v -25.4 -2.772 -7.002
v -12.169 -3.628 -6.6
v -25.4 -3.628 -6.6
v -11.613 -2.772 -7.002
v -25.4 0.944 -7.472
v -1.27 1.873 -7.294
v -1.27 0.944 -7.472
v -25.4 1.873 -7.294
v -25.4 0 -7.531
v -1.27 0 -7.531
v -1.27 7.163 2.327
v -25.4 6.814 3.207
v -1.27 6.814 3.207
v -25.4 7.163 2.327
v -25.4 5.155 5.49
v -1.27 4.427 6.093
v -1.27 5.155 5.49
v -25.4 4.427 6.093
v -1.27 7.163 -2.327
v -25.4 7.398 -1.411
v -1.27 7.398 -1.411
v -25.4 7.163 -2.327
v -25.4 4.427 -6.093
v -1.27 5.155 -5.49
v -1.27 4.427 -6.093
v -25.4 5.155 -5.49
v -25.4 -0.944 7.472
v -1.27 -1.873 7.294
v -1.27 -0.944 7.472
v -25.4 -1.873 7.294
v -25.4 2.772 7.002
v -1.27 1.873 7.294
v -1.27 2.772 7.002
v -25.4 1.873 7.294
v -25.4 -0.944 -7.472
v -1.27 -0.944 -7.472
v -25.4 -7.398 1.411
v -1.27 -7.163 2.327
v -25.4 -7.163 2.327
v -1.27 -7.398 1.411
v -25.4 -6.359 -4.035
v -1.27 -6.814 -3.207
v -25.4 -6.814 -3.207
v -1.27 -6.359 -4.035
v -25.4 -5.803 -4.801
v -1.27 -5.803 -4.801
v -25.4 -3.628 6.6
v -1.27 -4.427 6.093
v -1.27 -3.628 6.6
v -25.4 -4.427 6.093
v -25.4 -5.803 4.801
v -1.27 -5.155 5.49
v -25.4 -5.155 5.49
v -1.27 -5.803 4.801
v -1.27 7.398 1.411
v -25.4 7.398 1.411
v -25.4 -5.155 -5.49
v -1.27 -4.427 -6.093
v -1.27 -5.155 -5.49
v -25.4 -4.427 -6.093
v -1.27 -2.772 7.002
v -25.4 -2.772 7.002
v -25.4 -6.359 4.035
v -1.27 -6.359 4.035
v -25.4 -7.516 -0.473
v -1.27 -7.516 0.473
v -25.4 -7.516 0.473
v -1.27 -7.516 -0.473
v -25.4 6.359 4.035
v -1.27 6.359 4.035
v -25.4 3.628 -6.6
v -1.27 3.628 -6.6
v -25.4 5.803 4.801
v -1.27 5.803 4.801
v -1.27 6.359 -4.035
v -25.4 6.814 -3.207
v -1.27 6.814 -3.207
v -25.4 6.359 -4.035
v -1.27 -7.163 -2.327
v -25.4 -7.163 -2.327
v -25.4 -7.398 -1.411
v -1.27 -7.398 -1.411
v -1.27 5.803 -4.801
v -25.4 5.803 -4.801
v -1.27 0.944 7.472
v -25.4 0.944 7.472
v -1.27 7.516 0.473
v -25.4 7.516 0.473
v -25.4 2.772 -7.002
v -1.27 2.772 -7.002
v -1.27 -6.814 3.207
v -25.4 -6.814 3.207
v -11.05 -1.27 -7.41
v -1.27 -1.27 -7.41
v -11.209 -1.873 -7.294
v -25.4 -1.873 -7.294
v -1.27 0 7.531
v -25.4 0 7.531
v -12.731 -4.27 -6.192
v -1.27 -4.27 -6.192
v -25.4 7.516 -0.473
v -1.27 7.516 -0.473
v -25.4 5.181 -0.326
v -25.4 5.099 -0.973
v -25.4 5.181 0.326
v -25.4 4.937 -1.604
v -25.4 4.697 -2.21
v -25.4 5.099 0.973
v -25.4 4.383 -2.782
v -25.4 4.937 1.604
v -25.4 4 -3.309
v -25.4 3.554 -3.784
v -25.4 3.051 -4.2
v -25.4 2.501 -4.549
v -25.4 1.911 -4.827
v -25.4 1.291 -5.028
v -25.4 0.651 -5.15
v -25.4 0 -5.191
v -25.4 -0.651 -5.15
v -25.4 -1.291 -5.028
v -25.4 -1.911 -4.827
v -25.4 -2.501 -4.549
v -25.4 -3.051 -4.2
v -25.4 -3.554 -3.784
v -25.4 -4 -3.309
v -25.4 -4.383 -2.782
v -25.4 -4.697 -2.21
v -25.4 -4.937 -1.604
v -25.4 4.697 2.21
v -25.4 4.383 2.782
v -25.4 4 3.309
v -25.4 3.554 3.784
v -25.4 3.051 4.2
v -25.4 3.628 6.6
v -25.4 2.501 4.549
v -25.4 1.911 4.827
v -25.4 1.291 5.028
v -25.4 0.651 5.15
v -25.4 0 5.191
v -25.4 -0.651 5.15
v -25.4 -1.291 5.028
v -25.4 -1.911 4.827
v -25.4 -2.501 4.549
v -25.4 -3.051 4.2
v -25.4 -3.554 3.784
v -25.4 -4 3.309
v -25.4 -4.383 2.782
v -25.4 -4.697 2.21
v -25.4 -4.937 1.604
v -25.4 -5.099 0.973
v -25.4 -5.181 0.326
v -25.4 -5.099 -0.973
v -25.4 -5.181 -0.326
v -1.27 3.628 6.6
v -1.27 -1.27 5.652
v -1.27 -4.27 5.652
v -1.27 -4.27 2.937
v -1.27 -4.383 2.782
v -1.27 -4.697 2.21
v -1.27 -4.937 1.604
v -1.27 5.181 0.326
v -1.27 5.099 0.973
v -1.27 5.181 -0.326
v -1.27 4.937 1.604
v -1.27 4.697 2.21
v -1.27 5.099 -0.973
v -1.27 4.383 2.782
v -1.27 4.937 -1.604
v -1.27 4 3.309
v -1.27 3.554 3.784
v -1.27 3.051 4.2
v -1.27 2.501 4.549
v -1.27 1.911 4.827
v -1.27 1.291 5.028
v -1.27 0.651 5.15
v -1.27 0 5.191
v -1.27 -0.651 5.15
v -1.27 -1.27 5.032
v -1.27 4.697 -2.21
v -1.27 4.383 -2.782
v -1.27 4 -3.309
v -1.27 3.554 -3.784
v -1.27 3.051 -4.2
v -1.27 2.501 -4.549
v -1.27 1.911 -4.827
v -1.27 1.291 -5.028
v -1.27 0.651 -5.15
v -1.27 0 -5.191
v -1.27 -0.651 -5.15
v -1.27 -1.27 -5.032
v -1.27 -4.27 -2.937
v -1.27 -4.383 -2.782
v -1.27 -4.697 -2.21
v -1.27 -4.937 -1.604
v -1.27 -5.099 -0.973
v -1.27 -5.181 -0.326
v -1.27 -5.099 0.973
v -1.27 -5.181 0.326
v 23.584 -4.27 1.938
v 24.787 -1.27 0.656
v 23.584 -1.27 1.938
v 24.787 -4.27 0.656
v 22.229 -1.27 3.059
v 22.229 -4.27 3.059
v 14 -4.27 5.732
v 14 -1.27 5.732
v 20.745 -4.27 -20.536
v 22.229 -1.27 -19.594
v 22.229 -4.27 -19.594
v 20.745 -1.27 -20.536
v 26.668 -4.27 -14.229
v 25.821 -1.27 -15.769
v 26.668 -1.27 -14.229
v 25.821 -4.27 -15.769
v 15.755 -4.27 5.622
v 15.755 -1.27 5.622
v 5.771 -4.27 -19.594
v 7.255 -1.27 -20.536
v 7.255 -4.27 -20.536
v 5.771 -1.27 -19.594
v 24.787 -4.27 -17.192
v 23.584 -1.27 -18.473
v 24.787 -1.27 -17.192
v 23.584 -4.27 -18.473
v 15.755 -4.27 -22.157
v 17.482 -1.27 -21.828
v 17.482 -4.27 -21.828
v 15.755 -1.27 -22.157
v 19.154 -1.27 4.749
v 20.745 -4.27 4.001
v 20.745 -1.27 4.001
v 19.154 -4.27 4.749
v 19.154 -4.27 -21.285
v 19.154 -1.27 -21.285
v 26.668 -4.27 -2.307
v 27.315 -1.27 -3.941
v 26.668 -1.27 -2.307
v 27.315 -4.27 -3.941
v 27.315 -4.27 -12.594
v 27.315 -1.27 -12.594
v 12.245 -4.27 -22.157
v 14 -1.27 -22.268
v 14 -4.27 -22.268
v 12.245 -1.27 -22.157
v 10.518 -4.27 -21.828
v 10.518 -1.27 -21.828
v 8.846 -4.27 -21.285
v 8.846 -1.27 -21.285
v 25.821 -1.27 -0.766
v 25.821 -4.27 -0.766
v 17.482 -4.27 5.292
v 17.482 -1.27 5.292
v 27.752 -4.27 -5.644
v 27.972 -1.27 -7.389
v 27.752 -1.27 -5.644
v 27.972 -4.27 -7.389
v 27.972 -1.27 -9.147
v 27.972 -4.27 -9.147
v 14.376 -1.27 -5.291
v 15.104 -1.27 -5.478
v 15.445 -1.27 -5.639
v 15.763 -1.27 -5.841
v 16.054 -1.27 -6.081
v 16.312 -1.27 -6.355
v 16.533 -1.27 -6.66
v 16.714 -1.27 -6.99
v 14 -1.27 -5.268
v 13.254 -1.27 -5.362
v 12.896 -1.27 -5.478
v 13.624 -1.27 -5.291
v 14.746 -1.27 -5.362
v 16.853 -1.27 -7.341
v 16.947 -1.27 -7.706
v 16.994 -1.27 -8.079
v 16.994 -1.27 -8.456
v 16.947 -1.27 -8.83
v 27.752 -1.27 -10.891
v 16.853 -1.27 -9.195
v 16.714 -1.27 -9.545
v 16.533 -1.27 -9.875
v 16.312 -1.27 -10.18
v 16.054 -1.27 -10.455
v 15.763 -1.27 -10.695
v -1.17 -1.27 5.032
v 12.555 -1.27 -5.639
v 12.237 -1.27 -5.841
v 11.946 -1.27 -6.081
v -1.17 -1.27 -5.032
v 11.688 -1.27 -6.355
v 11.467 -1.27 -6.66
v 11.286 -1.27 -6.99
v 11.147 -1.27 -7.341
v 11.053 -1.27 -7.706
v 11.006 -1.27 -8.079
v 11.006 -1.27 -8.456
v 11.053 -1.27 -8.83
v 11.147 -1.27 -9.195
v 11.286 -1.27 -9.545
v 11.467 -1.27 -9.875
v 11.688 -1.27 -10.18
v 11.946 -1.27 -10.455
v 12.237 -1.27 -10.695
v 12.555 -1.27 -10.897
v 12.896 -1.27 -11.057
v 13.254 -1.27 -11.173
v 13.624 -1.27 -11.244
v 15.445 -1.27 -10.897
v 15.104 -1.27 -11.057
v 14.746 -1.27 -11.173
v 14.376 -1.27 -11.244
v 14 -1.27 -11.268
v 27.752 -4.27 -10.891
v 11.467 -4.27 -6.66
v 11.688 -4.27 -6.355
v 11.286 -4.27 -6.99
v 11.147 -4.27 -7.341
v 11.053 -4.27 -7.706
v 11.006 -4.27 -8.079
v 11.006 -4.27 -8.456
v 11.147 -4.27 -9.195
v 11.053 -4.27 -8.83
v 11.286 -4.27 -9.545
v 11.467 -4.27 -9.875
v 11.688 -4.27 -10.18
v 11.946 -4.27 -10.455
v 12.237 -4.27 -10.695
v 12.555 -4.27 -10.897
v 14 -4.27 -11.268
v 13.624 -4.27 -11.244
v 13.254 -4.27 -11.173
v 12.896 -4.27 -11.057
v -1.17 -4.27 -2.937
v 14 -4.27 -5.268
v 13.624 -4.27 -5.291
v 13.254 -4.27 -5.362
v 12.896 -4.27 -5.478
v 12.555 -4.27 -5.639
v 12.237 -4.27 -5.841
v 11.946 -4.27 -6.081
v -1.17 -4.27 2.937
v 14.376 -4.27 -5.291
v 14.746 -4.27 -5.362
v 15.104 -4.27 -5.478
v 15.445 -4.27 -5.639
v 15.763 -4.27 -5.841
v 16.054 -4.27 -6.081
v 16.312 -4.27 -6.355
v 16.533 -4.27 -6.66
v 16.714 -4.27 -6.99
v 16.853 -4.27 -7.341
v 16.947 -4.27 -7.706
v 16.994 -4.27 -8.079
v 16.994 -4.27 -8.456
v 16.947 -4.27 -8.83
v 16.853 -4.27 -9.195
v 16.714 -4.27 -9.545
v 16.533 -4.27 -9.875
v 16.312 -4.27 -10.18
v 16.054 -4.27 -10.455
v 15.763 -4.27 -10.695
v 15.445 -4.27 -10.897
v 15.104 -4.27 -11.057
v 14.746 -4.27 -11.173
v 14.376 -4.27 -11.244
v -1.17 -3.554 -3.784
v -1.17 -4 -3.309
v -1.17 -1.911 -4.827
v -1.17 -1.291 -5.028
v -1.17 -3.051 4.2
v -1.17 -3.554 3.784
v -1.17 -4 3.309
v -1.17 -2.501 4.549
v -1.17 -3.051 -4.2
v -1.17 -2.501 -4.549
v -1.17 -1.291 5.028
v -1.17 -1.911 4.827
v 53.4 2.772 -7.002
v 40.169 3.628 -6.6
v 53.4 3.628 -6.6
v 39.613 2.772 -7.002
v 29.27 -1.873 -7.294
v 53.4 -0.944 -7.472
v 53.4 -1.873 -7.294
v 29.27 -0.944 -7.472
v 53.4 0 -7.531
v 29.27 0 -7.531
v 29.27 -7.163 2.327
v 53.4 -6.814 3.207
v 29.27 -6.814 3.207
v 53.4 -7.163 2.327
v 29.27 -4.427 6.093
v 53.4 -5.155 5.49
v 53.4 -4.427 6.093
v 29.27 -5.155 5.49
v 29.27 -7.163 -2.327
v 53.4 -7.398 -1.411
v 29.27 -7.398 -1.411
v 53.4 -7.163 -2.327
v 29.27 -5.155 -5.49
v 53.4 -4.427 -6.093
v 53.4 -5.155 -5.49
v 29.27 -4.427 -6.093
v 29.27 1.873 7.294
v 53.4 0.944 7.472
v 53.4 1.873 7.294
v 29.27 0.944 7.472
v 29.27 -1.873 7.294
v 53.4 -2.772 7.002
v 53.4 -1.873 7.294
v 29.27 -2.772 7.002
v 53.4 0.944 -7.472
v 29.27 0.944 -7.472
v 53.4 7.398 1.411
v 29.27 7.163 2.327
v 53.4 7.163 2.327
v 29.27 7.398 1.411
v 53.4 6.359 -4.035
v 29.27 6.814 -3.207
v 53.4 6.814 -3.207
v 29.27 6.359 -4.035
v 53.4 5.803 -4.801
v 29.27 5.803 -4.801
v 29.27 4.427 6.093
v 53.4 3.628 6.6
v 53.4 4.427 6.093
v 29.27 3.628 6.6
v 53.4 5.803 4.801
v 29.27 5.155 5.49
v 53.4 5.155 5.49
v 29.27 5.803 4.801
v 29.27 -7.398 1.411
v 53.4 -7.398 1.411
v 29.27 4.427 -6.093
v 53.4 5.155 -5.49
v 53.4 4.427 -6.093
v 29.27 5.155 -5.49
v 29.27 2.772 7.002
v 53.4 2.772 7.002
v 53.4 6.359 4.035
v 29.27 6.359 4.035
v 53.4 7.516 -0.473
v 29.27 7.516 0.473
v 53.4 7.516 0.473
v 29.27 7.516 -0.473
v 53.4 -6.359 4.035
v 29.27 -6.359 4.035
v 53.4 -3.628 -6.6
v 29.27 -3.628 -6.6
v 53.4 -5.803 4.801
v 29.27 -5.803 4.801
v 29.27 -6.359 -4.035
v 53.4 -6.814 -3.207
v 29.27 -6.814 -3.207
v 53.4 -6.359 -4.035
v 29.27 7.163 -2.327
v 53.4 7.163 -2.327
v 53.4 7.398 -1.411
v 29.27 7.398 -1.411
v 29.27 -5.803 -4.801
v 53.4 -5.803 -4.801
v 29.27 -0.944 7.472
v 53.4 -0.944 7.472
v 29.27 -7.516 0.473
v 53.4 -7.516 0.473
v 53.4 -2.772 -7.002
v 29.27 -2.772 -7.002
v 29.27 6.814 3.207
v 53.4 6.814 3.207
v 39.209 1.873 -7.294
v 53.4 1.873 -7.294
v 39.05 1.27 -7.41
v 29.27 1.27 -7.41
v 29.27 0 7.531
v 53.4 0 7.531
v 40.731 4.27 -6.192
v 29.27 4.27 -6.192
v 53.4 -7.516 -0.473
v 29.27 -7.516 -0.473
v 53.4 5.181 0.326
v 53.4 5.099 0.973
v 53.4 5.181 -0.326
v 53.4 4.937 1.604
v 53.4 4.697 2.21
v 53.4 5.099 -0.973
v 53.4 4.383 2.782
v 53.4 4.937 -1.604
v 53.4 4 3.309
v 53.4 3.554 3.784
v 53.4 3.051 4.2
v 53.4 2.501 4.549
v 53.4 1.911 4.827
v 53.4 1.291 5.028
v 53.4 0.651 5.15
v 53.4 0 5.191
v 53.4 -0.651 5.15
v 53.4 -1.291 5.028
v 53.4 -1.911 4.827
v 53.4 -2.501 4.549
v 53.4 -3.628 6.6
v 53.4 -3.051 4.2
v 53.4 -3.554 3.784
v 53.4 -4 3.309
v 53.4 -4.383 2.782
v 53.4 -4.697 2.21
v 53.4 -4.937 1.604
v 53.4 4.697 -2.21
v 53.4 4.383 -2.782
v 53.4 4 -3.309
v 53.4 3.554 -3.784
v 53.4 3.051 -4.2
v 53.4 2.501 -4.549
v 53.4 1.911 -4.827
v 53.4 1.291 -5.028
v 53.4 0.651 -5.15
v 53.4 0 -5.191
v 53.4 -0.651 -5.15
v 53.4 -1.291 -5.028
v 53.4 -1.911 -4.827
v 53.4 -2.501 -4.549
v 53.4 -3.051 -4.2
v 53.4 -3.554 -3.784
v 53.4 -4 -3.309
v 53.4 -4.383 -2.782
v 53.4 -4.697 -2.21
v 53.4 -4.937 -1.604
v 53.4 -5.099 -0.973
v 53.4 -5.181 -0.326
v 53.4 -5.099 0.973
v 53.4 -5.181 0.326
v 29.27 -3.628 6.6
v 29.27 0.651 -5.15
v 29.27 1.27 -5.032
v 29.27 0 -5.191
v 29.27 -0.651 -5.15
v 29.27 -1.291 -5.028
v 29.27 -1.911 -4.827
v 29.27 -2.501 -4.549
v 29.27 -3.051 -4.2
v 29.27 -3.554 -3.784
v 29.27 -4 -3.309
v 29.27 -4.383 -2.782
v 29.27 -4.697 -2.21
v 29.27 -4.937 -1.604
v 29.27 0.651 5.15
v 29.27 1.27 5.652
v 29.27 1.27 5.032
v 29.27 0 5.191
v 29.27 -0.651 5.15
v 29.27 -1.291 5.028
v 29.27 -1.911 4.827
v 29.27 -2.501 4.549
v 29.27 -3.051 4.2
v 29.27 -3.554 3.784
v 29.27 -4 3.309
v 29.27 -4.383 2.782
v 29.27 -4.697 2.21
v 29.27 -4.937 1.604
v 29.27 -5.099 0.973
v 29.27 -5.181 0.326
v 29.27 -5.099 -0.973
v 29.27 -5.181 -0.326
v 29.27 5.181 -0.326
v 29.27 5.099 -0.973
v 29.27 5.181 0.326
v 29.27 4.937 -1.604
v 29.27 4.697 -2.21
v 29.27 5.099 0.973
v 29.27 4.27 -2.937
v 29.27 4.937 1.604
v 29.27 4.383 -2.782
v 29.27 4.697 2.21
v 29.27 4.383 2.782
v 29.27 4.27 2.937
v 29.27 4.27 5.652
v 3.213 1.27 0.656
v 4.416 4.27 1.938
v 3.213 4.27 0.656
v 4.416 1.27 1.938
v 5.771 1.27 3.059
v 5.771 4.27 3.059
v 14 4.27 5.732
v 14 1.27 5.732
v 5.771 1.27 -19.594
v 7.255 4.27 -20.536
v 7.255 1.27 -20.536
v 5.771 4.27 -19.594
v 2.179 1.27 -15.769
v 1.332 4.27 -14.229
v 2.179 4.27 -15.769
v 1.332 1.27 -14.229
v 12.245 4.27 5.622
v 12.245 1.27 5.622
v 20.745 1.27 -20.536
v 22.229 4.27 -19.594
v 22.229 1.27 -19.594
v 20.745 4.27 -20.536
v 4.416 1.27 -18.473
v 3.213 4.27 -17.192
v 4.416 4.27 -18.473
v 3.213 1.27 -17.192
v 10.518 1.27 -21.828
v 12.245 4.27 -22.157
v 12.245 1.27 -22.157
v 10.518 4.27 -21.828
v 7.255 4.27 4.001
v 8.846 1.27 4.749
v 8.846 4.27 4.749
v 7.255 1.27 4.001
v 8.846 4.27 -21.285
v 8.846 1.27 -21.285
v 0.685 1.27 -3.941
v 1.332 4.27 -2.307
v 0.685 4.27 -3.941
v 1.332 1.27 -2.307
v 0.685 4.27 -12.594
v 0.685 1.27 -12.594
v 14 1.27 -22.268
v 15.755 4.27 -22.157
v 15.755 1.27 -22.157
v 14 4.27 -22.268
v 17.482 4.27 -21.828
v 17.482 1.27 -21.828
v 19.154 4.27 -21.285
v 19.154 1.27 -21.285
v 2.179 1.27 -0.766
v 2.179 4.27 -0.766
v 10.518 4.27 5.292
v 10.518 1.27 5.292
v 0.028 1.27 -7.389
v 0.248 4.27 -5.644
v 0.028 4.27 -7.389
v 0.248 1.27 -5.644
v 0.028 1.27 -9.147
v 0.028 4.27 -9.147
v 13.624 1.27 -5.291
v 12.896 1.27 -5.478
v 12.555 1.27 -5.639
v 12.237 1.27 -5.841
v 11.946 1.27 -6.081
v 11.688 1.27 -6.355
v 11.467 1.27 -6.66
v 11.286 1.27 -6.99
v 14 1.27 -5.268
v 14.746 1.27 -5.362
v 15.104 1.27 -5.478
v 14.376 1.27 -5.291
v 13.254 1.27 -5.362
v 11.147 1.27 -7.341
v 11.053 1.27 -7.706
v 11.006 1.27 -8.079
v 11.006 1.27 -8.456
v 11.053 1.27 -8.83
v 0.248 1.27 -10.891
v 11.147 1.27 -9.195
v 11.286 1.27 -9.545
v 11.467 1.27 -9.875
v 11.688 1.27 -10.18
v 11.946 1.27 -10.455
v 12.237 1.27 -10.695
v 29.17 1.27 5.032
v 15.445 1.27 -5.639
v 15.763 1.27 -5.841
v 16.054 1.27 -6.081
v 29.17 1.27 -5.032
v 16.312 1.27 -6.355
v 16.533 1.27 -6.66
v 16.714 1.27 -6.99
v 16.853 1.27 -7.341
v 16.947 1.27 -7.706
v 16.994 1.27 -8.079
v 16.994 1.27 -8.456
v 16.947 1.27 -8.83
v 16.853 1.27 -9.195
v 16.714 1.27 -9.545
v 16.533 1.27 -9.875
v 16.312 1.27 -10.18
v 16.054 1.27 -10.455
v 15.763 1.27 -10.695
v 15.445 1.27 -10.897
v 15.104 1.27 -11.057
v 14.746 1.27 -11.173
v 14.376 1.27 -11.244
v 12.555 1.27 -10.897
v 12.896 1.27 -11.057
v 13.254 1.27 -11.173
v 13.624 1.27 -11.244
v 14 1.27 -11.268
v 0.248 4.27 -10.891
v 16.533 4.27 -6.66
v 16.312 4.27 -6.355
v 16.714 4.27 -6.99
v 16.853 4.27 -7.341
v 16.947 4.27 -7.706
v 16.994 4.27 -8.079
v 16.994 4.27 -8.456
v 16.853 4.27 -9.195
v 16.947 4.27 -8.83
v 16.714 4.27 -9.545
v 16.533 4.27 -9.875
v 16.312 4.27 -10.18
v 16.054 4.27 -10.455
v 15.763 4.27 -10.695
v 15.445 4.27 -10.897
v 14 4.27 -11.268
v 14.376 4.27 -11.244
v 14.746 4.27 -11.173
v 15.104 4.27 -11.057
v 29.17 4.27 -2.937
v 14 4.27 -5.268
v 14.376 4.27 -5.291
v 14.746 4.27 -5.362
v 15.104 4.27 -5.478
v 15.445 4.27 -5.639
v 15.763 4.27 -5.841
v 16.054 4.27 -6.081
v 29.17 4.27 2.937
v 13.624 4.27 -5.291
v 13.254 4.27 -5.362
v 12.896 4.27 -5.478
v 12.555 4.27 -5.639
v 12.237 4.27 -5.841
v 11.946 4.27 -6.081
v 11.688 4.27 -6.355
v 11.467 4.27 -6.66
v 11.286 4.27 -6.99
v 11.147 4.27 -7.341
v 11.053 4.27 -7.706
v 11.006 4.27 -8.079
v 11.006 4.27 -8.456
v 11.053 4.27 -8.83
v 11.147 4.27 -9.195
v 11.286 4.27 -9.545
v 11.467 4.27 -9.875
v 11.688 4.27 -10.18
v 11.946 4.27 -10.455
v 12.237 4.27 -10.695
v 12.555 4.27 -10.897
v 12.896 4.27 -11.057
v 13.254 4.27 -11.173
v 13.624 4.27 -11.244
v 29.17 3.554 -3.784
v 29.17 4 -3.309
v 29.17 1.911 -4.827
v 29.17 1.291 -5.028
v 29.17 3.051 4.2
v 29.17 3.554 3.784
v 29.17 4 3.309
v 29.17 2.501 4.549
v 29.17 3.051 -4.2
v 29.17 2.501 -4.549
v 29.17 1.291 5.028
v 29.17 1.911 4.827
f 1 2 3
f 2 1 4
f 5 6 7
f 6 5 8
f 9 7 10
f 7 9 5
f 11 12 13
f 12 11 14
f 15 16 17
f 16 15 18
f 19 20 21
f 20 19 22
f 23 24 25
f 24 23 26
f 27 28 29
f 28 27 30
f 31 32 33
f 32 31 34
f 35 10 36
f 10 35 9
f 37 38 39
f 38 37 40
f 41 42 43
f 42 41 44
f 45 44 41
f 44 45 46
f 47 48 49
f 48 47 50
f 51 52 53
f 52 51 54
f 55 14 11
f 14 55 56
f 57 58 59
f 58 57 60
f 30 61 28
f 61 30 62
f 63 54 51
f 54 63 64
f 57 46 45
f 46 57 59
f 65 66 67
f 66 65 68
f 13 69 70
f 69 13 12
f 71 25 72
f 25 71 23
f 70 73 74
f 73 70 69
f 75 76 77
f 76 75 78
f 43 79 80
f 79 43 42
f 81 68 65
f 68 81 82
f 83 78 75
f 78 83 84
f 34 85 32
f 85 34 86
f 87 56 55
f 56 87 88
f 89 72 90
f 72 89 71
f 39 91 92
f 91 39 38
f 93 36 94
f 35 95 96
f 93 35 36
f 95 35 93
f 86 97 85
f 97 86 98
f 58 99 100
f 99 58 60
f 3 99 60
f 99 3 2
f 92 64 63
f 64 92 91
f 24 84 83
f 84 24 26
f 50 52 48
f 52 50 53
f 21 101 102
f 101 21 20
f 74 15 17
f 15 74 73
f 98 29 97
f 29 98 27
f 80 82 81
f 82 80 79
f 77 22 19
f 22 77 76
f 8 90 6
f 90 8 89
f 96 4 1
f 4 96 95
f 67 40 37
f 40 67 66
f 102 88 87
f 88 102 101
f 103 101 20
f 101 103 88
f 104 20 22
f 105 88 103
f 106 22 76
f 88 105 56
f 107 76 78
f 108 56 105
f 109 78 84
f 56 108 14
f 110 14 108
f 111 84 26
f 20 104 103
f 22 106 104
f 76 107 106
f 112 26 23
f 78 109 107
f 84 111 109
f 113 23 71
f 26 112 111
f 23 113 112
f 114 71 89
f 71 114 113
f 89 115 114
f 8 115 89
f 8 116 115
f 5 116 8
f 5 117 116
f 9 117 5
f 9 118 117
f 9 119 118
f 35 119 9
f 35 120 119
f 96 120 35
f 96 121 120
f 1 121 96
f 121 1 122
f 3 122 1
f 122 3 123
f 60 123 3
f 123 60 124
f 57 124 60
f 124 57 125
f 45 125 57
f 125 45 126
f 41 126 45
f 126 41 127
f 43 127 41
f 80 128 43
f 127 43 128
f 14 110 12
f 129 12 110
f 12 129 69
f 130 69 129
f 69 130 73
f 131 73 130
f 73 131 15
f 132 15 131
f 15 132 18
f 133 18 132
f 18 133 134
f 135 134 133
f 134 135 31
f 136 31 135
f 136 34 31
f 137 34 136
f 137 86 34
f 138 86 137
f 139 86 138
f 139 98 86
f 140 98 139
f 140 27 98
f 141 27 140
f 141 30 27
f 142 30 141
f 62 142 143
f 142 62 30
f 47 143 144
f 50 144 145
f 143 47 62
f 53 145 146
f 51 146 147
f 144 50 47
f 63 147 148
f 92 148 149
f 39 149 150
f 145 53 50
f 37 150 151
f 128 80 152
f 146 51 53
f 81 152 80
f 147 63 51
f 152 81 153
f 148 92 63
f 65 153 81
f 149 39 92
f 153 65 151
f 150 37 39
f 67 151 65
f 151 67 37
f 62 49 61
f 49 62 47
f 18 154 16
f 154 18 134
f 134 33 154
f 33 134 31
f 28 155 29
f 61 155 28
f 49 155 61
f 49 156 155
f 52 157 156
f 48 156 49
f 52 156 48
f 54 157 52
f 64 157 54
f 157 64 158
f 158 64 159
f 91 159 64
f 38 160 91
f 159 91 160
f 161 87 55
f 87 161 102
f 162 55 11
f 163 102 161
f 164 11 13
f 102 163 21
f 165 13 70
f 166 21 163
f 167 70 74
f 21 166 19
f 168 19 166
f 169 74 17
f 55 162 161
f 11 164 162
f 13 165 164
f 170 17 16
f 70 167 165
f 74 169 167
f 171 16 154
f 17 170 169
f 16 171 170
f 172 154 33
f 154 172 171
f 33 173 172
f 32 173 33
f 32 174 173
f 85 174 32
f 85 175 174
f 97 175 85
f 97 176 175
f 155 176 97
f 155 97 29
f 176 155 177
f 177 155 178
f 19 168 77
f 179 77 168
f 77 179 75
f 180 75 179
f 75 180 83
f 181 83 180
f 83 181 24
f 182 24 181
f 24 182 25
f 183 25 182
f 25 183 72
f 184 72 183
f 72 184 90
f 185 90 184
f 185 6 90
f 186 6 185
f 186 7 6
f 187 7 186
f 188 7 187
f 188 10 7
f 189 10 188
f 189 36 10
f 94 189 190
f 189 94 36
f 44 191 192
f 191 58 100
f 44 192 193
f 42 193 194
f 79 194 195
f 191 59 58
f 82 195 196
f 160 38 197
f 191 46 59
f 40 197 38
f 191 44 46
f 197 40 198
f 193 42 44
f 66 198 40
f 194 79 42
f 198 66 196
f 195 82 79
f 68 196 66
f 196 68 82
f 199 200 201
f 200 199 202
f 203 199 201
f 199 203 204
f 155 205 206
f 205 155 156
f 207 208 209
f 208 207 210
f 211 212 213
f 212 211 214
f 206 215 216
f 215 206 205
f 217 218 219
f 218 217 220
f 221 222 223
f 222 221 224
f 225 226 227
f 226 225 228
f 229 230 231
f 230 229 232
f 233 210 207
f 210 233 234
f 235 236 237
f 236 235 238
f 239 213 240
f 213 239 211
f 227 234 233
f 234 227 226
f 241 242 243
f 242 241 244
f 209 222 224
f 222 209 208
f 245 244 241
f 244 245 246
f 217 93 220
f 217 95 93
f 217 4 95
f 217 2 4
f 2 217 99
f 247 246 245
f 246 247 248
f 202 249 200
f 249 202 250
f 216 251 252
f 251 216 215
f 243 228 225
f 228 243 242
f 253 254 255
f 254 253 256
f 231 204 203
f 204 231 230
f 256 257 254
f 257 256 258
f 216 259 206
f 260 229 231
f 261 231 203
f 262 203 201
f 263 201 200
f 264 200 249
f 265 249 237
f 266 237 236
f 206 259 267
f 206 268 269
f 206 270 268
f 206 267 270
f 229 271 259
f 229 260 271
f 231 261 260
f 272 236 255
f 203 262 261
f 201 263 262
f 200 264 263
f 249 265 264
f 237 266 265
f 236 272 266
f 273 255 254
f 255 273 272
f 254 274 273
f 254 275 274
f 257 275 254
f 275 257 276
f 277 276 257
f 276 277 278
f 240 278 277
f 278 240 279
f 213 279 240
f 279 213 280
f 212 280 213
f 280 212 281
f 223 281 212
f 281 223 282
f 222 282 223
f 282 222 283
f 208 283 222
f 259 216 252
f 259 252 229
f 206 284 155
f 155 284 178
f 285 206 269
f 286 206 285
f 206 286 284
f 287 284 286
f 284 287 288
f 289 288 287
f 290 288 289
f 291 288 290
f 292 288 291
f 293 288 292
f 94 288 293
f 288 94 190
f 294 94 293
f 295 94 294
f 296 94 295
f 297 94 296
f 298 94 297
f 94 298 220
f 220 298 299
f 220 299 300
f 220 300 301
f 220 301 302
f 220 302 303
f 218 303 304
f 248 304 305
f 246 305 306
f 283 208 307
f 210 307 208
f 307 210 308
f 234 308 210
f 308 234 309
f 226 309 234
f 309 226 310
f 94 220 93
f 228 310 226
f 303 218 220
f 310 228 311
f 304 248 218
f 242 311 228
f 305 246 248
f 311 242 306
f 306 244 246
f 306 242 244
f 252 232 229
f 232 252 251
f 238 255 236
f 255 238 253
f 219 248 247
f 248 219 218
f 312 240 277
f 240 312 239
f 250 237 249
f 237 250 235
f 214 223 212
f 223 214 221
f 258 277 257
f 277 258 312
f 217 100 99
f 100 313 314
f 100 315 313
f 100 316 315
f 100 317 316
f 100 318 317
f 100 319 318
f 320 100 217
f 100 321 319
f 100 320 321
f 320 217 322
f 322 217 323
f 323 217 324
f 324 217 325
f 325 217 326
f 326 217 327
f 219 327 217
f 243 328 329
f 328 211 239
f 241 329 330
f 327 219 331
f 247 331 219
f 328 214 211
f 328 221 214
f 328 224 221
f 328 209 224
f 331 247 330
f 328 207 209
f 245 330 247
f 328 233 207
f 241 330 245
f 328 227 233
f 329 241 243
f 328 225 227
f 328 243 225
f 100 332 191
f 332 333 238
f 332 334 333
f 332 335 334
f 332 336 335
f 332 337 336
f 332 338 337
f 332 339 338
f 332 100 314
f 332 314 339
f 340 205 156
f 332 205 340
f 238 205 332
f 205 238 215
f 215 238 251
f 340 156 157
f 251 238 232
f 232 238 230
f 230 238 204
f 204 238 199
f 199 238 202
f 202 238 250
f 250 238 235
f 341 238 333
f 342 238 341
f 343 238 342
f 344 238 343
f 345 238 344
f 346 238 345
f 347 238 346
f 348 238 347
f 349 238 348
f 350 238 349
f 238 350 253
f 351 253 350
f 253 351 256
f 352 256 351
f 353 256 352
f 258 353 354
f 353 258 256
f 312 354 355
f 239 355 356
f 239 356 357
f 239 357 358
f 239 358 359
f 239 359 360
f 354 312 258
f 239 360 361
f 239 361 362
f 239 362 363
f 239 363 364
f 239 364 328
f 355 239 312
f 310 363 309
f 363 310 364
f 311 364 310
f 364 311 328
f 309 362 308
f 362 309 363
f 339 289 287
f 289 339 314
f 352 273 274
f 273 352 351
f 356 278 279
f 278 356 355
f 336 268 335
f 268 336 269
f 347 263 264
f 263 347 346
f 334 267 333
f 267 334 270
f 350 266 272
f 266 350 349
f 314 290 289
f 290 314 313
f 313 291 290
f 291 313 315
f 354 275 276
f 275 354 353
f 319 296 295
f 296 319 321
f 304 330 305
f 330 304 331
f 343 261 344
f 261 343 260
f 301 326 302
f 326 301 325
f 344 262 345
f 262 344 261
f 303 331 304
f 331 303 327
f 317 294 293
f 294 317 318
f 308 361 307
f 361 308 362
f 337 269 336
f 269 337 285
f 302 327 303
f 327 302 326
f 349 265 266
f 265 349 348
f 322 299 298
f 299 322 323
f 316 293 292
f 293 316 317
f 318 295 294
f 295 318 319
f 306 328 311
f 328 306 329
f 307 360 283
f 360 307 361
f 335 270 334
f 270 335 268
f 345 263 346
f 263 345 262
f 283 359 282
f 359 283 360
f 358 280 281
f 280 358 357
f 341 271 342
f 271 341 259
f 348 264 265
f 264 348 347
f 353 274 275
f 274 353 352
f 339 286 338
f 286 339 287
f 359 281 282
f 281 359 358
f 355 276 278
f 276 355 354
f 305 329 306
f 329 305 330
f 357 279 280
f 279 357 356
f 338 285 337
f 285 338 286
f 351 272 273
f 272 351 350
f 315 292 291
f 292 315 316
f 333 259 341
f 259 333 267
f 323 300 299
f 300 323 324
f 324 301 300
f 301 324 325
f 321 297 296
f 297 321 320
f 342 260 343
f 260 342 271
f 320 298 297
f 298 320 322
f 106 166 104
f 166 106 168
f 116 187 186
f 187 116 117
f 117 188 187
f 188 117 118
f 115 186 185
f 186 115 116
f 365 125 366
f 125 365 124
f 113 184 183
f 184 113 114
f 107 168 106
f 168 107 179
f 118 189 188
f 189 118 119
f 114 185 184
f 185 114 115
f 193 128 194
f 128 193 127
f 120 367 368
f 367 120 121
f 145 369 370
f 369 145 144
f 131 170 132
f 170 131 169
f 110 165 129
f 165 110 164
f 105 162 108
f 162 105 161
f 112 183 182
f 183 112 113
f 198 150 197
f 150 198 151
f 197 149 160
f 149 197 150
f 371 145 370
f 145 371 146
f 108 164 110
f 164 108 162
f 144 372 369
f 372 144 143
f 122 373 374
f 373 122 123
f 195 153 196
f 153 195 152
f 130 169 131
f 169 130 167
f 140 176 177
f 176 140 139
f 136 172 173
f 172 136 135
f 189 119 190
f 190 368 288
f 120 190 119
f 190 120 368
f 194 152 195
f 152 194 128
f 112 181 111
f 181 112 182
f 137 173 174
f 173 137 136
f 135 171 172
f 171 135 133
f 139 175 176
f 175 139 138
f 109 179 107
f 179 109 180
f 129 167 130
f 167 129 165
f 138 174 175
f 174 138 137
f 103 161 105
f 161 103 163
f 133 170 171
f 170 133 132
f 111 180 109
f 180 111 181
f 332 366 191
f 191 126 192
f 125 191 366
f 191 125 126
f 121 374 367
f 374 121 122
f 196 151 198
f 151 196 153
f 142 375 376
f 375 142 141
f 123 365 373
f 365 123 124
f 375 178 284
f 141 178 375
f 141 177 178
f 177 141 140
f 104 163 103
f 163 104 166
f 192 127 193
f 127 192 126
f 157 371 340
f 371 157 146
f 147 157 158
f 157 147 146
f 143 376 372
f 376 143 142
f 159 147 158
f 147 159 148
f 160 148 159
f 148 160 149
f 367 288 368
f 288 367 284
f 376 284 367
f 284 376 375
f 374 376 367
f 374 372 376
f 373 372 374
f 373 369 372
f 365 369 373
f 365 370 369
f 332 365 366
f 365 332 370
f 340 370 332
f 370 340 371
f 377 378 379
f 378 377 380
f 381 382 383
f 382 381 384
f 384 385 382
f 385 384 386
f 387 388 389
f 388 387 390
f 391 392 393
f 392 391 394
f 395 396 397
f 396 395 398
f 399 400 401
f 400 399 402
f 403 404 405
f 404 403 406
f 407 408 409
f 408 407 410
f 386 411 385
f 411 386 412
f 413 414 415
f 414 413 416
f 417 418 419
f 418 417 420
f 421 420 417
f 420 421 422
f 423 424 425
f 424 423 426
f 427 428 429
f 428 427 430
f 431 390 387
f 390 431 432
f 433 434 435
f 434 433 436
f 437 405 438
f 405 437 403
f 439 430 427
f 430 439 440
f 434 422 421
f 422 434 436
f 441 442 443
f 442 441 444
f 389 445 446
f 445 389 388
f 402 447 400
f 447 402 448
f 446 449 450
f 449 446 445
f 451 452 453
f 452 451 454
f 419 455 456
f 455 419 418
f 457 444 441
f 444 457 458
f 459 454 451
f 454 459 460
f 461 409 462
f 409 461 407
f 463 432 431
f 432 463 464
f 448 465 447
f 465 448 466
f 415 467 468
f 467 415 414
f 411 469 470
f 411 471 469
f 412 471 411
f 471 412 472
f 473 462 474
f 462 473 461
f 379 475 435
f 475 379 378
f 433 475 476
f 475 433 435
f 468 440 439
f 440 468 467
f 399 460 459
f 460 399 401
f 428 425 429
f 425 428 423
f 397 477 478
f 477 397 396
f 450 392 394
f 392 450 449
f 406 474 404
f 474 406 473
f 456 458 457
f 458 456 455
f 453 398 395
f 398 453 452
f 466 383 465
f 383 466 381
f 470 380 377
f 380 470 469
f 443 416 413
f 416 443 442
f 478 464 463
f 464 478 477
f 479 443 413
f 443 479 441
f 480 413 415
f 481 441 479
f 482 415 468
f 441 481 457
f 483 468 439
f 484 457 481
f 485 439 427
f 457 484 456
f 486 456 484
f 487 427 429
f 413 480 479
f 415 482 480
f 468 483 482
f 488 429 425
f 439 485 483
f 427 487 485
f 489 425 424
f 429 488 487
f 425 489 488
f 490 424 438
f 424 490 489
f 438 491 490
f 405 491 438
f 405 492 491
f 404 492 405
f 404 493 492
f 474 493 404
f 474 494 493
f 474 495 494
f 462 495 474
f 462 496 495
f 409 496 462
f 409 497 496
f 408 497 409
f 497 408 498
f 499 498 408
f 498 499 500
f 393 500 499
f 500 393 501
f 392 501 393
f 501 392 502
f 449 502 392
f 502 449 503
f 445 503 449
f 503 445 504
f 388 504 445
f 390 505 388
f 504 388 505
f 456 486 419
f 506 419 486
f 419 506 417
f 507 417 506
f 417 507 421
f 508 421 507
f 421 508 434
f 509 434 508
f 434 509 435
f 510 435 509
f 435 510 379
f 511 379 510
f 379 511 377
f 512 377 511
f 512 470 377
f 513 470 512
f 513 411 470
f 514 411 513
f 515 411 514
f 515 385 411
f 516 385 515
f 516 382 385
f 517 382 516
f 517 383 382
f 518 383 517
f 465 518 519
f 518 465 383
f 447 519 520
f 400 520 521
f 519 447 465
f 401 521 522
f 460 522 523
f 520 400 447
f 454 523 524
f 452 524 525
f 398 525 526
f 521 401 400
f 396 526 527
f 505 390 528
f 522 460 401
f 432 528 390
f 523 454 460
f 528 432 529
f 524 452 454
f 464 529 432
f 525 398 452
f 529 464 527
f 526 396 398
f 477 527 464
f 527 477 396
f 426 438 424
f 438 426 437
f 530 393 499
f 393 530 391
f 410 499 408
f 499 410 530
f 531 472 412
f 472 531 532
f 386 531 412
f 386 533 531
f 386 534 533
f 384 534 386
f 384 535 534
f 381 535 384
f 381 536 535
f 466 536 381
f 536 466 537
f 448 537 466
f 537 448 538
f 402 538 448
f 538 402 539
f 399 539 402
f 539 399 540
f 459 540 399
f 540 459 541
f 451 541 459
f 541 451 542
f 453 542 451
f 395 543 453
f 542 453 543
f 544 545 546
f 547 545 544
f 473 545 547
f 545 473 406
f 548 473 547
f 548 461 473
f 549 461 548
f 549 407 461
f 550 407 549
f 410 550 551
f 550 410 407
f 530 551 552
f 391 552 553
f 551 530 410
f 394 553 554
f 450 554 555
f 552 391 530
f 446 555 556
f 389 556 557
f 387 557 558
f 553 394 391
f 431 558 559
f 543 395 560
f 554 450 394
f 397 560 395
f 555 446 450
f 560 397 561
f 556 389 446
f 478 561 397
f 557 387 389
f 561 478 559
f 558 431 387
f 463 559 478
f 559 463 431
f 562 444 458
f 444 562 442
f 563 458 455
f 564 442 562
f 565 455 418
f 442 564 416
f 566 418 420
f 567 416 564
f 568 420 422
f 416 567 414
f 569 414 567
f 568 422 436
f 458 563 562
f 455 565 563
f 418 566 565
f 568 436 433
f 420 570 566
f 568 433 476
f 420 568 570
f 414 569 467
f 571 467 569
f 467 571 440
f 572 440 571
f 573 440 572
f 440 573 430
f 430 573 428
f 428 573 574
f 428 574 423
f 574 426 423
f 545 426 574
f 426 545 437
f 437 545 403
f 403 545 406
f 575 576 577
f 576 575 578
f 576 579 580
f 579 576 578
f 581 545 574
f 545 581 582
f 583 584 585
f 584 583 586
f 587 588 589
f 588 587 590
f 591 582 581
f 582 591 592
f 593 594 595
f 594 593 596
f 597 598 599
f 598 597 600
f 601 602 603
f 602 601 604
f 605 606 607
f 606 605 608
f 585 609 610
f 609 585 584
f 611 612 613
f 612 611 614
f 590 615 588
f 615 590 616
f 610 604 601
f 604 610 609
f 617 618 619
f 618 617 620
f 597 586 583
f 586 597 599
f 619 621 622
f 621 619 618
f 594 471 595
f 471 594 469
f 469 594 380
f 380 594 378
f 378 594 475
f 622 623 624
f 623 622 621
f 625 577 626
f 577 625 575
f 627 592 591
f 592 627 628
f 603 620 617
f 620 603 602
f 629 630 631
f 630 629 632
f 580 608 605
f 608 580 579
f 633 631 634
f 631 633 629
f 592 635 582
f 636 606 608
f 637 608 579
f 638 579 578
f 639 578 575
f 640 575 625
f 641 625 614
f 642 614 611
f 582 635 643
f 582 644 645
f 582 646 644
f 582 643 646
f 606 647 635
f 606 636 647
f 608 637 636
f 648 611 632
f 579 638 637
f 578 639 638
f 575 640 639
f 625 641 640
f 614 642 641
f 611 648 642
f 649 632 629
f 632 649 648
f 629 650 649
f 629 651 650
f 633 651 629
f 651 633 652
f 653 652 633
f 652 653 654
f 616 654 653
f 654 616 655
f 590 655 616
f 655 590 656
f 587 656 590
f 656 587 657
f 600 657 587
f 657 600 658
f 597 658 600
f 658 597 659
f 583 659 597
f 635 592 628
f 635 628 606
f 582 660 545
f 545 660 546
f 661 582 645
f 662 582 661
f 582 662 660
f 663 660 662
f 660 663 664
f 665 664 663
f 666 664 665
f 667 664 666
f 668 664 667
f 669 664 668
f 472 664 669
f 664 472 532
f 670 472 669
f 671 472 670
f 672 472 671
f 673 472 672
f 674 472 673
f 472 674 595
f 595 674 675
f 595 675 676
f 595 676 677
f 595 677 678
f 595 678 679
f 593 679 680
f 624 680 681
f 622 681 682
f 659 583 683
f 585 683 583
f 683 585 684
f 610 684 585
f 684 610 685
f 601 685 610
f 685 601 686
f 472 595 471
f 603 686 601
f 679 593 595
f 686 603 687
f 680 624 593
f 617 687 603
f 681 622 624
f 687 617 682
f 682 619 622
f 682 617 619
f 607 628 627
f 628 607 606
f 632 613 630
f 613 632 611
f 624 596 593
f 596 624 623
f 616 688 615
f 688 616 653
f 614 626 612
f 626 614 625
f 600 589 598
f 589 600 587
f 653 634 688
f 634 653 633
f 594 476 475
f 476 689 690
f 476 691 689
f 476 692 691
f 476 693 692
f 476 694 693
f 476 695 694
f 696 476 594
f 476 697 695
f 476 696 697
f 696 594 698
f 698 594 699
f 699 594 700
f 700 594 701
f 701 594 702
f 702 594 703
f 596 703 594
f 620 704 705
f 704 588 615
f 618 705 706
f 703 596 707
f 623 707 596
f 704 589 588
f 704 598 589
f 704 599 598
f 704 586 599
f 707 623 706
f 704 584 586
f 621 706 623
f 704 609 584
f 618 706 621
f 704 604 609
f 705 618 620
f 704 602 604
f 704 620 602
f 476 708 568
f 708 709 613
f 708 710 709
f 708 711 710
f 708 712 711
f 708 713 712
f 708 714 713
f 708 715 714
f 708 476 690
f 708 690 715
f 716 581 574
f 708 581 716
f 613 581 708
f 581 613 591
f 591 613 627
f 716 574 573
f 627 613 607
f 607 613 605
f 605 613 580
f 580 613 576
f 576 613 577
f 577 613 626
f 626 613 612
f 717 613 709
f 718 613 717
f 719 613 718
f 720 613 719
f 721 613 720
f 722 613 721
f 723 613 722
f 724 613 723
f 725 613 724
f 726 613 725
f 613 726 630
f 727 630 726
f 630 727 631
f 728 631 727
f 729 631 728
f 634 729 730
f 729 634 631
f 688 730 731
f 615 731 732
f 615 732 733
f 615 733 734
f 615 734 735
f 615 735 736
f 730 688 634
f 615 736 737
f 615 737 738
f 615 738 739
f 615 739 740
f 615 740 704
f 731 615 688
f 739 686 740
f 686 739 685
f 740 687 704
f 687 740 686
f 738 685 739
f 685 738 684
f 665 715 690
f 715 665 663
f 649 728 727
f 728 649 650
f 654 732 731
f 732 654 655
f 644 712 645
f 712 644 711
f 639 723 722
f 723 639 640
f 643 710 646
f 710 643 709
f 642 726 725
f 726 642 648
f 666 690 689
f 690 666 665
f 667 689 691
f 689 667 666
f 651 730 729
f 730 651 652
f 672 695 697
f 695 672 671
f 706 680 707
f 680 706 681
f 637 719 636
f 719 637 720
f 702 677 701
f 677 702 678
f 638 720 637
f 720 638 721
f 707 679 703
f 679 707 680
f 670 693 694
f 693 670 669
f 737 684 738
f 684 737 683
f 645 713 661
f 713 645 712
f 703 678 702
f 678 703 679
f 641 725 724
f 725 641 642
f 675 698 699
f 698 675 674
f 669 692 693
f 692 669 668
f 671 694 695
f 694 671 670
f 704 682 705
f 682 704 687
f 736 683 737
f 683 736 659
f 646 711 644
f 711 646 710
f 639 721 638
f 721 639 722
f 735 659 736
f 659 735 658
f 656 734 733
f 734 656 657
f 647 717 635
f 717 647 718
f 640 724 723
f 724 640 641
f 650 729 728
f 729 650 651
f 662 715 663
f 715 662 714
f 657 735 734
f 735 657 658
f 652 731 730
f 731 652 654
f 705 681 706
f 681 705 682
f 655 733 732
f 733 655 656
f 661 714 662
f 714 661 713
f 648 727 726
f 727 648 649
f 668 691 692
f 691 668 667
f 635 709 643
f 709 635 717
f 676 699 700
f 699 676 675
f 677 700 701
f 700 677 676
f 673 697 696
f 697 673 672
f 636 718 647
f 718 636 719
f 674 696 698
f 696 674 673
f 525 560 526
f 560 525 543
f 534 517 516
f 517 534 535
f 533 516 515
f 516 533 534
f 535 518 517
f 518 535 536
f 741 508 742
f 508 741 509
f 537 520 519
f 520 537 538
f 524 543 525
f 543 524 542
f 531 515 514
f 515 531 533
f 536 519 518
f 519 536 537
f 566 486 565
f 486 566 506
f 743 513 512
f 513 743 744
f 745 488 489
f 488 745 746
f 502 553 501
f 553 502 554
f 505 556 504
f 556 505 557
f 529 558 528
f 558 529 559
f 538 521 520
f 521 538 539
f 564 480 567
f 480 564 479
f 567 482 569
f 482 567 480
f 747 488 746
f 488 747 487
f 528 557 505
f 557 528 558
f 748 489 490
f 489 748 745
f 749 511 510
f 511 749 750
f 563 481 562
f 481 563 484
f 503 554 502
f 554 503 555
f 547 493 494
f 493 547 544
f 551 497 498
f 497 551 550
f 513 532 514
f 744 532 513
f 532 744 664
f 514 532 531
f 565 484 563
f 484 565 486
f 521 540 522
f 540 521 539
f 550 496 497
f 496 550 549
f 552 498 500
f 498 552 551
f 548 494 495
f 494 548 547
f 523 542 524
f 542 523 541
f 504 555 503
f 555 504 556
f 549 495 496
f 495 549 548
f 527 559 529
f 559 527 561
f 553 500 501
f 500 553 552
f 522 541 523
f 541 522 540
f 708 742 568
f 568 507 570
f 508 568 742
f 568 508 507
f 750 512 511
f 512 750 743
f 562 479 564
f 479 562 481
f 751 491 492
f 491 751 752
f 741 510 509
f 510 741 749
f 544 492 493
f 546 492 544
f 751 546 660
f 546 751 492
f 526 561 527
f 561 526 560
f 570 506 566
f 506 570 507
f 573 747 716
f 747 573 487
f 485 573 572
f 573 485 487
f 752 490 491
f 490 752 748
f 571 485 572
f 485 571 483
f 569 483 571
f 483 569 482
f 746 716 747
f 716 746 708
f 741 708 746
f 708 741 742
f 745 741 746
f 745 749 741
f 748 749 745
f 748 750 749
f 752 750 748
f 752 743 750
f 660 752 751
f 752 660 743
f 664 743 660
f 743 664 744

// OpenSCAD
in = 25.4;
$fn = 50;

carbonTube1 = [0.314*in,0.393*in,"McMaster"];

myTube = carbonTube1;
tubeId = myTube[0];
tubeOd = myTube[1];
tubeLen = 12*in;


module tube(id, od, length)
{
    translate([-length/2,0,0])
    rotate([0,90,0])
    difference()
    {
        cylinder(r=od/2,h=length);
        translate([0,0,-0.1])
        cylinder(r=id/2,h=length+0.2);
    }
}

module connector(tubeOd,tubeWall,thickness,length,plateThickness,gap,bearing,flange,adj)
{
    rotate([0,90,0])
    {
        holeTranslation = [tubeOd/2+tubeWall+gap/2,-gap/2,length+gap/2+bearing/2+flange];
        difference()
        {
            union()
            {
                difference()
                {
                    cylinder(r=tubeOd/2+thickness, h=length);
                    
                }
                
                translate([holeTranslation[0],holeTranslation[1],0])
                rotate([90,0,0])
                linear_extrude(plateThickness)
                hull()
                {
                    translate([-1.5*gap-tubeOd,0])
                    square(gap);
                    translate([0,holeTranslation[2]])
                    circle(bearing/2+flange);
                }
            }
            translate(holeTranslation)
            rotate([90,0,0])
            translate([0,0,-0.1])
            cylinder(r=bearing/2,h=plateThickness+0.2);
                    translate([0,0,-0.1])
                    cylinder(r=tubeOd/2+adj, h=length+0.2);
        }
    }
}

connectorThickness = 0.1*in;
connectorPlateThickness = 3;
connectorPlateSide = 2*in;
connectorPlateOverlap = 0.2*in;
connectorAdj = 0.2;
connectorGap = 0.1*in;
connectorLength = (connectorPlateSide - connectorGap)/2;
bearingHole = 6;  // was 12
flange = 11;  // was 8

tubeWall = tubeOd - tubeId;

/*
translate([tubeLen/2-connectorLength,0,0])
connector(tubeOd,connectorThickness,connectorLength,connectorPlateThickness,connectorPlateSide,connectorGap,connectorAdj);

color("gray")
tube(tubeId,tubeOd,tubeLen);
*/


translate([-connectorPlateSide/2,0,0])
connector(tubeOd,tubeWall,connectorThickness,connectorLength,connectorPlateThickness,connectorGap,bearingHole,flange,connectorAdj);

rotate([0,0,180])
translate([-connectorPlateSide/2 - bearingHole - 2*flange,0,0])
connector(tubeOd,tubeWall,connectorThickness,connectorLength,connectorPlateThickness,connectorGap,bearingHole,flange,connectorAdj);
